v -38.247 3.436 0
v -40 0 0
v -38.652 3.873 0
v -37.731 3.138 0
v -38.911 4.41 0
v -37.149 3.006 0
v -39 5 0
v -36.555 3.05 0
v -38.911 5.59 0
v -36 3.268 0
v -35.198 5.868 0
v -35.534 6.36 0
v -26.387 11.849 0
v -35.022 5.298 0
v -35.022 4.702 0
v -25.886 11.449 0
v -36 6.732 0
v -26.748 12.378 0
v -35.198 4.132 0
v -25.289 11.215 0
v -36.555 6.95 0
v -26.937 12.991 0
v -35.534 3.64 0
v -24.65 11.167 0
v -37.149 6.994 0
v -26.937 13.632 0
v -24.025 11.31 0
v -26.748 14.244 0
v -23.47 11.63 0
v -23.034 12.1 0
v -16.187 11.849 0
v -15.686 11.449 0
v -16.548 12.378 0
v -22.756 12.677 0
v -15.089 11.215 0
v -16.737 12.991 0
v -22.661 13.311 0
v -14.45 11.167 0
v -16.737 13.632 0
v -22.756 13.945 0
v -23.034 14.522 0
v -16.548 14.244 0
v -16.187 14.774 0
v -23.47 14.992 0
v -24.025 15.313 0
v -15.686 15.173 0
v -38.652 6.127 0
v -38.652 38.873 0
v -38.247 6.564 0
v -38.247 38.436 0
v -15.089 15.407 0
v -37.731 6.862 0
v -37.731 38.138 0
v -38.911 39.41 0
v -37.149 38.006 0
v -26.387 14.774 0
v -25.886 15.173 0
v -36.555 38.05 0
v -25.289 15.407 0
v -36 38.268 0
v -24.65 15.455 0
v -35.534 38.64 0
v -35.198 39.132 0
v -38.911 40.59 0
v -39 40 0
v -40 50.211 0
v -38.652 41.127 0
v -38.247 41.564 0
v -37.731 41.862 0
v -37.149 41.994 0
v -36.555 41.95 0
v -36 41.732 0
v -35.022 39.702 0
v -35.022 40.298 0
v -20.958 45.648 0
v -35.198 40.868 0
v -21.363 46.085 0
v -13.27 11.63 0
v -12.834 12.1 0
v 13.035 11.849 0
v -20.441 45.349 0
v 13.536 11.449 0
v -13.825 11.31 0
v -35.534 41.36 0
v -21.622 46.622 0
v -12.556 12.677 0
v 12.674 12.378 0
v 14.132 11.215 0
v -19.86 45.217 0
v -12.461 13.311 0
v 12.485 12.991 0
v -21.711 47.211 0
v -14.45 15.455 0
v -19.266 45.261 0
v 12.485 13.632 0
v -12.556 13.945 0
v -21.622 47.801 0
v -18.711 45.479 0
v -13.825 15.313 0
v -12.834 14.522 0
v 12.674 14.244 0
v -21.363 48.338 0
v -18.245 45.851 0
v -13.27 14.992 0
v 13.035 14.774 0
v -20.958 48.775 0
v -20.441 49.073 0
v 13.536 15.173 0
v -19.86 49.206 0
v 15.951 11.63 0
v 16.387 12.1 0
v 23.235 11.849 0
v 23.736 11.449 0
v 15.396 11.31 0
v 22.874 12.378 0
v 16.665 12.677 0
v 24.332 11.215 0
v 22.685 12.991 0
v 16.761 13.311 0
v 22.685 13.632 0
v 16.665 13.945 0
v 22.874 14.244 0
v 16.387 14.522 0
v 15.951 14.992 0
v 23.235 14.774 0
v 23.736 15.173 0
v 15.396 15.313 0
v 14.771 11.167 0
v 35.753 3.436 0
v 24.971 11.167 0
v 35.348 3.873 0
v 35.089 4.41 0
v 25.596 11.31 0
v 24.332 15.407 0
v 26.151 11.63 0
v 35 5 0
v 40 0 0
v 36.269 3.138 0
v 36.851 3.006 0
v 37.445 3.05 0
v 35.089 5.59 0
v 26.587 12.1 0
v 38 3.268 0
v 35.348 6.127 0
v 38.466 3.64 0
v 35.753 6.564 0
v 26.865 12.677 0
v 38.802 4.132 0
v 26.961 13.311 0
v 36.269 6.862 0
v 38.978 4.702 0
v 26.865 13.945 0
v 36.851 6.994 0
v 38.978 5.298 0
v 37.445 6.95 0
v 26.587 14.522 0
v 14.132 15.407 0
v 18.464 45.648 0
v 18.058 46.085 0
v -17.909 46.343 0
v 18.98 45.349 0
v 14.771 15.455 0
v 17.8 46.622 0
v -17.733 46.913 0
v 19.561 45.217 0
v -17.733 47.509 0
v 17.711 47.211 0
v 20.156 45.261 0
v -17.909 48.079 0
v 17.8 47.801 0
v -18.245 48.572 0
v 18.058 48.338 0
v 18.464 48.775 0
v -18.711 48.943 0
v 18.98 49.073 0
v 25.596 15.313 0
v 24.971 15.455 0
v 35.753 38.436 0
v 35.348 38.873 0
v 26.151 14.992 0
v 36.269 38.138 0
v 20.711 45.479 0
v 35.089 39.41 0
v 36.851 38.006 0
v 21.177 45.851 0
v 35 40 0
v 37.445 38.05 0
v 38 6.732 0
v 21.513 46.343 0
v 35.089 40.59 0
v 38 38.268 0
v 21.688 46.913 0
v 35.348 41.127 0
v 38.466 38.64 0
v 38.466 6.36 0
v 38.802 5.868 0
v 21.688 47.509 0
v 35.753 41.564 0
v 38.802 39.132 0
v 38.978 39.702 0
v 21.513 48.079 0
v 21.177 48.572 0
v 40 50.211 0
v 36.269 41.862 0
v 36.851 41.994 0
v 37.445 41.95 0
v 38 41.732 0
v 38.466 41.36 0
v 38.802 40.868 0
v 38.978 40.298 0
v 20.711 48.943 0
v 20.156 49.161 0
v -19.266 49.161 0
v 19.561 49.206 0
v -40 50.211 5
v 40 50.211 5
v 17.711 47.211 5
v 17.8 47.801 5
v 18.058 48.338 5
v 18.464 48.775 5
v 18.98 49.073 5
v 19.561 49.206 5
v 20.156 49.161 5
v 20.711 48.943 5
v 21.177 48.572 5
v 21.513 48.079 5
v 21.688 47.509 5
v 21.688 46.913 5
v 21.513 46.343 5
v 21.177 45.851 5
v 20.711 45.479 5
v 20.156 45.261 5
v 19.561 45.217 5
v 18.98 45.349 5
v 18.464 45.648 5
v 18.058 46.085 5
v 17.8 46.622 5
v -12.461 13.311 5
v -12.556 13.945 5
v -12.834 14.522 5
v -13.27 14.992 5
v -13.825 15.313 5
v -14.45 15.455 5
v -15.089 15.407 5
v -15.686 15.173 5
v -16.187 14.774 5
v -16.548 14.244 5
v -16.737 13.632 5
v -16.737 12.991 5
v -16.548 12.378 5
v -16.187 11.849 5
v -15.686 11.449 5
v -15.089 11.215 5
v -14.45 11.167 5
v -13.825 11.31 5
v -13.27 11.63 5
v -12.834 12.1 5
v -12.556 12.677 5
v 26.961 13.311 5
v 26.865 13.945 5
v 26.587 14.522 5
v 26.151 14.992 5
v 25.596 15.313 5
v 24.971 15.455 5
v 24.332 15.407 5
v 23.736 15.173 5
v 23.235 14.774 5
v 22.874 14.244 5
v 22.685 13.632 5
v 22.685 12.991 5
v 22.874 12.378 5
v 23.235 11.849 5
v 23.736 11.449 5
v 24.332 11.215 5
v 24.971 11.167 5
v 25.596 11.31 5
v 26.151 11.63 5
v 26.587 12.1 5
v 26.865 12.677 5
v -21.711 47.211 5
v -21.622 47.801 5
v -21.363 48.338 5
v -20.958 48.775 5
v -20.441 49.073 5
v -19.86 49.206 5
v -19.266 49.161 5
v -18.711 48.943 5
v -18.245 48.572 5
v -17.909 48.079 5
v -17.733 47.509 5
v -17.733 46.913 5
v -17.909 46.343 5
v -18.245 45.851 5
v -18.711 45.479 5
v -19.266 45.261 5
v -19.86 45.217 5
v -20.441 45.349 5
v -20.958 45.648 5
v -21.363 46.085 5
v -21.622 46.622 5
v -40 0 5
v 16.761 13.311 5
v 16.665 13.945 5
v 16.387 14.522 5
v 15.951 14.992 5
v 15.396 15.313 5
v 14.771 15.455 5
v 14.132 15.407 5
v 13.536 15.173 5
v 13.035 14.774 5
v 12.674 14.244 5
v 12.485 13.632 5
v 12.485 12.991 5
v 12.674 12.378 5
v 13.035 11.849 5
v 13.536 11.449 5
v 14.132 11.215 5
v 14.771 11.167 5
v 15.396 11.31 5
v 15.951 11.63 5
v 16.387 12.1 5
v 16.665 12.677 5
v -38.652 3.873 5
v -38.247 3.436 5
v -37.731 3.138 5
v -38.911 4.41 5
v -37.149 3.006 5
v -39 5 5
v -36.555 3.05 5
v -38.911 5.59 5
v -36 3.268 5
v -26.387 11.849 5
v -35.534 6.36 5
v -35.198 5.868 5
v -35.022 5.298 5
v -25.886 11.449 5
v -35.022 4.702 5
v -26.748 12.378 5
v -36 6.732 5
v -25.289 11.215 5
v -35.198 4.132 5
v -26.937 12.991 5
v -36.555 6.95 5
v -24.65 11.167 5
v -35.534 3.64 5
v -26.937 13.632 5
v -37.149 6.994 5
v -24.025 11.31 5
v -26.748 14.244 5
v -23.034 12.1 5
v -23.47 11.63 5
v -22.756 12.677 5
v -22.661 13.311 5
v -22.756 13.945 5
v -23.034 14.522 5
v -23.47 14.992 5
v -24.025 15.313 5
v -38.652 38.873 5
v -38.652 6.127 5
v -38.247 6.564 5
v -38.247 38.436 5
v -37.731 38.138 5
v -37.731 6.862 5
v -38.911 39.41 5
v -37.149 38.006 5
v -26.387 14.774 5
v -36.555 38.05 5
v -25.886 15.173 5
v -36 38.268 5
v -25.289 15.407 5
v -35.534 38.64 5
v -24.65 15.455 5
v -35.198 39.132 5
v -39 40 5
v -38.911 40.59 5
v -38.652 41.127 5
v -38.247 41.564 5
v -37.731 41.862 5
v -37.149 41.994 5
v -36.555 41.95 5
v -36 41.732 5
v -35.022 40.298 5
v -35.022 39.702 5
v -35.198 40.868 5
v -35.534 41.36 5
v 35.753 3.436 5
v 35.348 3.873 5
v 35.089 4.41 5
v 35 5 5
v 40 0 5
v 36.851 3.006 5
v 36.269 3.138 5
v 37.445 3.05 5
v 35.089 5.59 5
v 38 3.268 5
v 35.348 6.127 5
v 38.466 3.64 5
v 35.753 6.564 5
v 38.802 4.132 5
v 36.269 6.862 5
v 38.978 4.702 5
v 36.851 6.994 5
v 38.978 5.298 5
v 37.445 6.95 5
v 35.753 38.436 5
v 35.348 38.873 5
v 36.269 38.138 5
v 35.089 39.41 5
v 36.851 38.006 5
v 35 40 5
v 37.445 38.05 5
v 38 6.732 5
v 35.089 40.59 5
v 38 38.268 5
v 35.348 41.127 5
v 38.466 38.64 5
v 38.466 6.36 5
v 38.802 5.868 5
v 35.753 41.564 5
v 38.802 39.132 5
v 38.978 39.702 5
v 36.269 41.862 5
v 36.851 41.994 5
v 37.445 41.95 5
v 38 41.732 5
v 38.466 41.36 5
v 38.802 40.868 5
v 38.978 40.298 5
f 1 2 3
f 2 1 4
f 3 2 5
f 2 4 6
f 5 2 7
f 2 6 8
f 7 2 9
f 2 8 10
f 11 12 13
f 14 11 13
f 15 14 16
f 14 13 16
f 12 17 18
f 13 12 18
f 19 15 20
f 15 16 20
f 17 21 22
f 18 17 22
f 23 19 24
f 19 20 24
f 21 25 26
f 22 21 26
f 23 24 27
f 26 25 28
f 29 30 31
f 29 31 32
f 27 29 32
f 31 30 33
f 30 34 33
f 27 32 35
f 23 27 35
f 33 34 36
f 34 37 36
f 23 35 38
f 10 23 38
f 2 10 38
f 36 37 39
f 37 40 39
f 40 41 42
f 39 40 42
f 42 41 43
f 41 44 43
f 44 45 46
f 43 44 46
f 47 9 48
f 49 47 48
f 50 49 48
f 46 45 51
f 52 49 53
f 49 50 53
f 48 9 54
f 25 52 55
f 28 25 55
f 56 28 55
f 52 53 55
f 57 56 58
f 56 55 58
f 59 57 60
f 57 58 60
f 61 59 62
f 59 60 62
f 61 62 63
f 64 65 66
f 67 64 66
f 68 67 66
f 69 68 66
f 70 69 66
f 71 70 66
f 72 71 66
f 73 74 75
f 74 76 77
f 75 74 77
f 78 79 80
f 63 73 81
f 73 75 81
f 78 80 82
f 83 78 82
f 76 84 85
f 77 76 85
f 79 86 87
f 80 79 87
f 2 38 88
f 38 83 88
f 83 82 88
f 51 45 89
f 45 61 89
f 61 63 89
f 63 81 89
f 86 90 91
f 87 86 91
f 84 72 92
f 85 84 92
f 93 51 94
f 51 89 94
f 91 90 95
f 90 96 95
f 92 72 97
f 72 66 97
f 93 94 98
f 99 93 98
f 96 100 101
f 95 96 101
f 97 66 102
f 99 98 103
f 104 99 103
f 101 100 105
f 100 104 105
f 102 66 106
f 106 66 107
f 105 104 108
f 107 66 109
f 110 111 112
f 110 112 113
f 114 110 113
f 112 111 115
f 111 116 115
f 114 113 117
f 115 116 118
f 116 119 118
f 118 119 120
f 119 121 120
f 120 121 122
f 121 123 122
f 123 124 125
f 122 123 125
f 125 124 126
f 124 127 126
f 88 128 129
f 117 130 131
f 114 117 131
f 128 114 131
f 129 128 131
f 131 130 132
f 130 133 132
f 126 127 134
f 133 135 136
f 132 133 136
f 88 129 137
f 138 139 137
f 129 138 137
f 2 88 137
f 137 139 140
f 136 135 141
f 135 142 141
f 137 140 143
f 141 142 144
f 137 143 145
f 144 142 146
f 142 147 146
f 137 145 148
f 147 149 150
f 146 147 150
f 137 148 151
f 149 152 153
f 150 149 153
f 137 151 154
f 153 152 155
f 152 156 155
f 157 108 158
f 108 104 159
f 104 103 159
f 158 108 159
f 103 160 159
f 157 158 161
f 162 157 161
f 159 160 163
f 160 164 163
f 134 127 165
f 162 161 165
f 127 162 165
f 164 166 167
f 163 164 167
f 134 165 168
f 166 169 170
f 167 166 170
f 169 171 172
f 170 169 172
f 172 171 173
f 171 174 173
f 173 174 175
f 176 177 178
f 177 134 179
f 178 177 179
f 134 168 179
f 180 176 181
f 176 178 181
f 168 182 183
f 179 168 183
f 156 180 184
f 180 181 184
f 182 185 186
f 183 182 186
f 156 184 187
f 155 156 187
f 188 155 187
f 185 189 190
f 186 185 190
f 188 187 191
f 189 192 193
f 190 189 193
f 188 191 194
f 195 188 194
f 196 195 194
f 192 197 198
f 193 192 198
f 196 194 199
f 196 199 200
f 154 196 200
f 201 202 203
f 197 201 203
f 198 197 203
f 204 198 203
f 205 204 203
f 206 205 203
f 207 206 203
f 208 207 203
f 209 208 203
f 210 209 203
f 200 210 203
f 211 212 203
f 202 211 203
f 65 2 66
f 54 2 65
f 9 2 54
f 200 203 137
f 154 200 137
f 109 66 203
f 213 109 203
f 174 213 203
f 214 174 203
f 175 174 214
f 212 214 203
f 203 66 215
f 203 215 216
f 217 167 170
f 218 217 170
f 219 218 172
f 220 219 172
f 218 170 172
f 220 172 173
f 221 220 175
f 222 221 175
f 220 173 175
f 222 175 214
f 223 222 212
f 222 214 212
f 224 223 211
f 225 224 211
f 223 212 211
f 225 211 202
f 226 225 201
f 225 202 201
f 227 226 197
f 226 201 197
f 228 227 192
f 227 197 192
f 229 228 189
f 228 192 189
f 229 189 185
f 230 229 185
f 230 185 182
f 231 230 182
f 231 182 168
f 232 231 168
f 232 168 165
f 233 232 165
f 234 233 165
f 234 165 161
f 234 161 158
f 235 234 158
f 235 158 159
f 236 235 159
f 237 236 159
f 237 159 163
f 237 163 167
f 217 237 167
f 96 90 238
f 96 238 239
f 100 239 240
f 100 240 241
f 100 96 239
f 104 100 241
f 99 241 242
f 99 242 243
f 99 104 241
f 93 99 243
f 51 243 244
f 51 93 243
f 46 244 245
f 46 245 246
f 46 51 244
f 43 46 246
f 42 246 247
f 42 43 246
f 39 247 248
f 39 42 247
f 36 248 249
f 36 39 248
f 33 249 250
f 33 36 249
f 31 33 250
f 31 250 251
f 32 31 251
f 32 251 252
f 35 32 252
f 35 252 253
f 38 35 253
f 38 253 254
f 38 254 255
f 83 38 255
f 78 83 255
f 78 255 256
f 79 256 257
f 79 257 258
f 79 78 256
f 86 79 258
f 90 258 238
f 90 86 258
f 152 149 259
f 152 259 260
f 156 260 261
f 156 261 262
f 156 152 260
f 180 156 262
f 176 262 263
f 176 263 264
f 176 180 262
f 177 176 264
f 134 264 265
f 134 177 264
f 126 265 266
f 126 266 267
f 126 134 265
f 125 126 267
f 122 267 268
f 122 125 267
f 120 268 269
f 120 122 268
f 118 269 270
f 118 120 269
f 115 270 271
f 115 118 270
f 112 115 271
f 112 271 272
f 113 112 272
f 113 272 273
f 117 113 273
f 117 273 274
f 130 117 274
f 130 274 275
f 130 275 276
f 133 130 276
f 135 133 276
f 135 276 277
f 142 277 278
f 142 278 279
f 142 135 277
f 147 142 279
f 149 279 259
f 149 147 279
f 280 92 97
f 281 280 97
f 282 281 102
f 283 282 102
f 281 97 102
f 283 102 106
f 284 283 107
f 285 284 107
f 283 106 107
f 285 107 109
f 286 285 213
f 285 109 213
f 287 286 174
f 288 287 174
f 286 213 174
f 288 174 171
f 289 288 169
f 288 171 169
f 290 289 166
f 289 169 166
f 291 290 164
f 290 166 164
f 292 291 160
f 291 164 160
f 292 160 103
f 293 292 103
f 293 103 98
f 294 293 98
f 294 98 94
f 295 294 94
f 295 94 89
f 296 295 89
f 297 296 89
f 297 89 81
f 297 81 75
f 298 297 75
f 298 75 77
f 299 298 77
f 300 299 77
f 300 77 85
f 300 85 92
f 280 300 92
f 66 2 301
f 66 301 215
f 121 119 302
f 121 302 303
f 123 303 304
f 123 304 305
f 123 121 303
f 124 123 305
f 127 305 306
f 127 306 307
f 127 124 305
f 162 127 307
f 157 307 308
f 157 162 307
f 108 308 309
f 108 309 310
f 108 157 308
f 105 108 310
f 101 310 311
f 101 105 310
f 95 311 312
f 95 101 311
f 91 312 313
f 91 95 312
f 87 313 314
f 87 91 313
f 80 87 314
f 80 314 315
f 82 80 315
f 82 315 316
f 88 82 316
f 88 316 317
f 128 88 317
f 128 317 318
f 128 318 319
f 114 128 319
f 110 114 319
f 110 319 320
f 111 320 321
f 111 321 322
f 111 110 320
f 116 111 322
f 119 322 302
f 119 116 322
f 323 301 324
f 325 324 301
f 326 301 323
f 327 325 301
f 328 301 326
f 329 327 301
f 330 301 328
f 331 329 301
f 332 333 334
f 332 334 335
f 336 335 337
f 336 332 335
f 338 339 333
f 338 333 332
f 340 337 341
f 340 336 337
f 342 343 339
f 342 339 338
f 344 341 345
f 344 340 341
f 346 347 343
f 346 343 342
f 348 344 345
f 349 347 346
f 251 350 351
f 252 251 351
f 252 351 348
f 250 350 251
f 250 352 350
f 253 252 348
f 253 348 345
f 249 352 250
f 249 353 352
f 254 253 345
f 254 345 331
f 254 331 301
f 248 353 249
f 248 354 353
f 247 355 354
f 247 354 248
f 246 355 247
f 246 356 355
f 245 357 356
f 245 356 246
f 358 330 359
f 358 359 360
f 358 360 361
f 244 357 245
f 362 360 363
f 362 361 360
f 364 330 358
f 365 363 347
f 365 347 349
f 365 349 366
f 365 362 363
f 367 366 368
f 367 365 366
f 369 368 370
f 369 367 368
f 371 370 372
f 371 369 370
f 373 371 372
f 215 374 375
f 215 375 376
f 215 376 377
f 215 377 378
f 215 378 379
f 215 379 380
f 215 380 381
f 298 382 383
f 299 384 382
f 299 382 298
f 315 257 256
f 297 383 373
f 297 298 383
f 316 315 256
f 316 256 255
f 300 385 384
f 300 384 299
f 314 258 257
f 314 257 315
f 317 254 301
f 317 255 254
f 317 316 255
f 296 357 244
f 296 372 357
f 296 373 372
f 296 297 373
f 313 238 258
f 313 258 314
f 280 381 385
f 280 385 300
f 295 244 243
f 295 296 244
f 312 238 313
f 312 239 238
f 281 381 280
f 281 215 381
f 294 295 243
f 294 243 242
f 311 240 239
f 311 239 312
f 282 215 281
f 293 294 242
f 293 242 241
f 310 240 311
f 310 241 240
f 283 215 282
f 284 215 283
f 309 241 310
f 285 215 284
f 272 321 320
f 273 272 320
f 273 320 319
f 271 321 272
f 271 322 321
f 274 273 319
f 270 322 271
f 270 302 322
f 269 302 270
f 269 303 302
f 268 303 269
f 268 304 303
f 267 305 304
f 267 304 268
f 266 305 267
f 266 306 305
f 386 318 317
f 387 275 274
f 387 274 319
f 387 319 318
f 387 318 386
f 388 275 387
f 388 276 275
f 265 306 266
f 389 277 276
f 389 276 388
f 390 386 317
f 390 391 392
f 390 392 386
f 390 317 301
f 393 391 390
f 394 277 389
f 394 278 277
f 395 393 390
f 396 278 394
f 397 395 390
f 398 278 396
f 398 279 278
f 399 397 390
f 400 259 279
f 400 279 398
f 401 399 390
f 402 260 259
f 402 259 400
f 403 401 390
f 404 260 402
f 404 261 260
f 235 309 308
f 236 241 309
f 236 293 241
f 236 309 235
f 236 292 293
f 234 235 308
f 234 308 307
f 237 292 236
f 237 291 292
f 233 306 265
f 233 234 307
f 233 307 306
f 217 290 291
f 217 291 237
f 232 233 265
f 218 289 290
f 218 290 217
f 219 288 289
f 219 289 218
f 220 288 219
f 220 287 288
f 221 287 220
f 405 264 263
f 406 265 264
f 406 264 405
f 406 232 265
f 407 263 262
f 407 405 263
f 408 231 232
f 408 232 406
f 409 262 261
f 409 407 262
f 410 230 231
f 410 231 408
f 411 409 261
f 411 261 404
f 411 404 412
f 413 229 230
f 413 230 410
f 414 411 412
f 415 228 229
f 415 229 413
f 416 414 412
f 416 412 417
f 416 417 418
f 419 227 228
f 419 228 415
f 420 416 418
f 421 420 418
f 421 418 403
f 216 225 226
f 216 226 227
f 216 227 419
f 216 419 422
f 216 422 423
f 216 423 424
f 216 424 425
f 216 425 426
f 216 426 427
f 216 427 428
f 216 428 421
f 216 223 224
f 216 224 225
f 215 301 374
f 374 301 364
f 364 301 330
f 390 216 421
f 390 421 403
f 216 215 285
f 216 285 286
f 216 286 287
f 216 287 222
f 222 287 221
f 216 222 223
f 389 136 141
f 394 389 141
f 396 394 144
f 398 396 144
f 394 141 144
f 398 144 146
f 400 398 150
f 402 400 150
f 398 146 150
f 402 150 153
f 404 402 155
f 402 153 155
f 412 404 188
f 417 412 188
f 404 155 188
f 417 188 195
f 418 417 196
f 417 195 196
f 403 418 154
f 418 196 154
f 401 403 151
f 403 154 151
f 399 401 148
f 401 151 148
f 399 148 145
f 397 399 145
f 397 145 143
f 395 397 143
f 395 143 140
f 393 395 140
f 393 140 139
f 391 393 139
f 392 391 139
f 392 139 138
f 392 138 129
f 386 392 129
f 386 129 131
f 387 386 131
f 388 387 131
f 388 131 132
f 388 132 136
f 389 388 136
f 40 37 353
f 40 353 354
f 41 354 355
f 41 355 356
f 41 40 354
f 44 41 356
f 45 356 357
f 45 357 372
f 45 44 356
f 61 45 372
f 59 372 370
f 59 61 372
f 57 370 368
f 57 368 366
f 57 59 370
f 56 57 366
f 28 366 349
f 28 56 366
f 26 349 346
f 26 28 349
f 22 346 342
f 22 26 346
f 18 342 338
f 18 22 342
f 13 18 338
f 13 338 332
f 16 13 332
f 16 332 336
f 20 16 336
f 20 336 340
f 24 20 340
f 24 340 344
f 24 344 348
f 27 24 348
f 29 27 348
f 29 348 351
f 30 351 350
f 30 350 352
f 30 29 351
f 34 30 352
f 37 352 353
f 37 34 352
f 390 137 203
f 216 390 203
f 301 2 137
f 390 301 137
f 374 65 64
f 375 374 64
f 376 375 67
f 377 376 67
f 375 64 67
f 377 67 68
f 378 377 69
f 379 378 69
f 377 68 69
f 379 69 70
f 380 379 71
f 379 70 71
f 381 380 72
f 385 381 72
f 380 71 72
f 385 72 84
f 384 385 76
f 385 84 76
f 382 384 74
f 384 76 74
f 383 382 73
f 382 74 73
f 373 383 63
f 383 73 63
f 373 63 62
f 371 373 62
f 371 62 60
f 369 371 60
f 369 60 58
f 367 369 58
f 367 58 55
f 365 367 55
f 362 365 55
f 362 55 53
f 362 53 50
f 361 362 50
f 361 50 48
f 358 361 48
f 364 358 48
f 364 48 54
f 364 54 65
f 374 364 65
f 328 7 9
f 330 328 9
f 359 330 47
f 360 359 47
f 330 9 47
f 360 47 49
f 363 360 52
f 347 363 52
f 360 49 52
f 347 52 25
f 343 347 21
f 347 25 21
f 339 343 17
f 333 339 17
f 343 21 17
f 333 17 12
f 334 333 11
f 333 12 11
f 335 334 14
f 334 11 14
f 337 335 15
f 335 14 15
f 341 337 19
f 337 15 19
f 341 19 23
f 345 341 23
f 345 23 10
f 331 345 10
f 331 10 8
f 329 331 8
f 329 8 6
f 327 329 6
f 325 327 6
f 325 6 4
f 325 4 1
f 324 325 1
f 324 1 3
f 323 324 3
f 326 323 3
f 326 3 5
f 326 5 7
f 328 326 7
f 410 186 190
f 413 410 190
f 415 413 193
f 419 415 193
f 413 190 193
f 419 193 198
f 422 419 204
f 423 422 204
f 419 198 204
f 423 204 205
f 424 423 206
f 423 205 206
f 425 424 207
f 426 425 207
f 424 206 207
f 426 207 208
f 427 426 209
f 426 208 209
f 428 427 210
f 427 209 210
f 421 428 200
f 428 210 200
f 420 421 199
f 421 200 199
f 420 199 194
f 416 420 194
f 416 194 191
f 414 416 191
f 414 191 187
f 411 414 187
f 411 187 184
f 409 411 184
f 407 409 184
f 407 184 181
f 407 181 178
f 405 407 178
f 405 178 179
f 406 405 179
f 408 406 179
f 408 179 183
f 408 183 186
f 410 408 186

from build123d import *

# Parameters (mm, degrees)
SKETCH1_W           = 80
SKETCH1_H           = 50.211199845
SKETCH1_R           = 2.15
BOSS_EXTRUDE1_DEPTH = 5
SKETCH2_R           = 2
CUT_EXTRUDE1_DEPTH  = 10


with BuildPart() as part:
    # Sketch1 → Boss-Extrude1 (new body)
    with BuildSketch(Plane.XY):
        with Locations((0, 25.105599923)):
            Rectangle(SKETCH1_W, SKETCH1_H)
        with Locations((14.610738527, 13.311199845)):
            Circle(SKETCH1_R, mode=Mode.SUBTRACT)
        with Locations((24.810738527, 13.311199845)):
            Circle(SKETCH1_R, mode=Mode.SUBTRACT)
        with Locations((-14.610738527, 13.311199845)):
            Circle(SKETCH1_R, mode=Mode.SUBTRACT)
        with Locations((-24.810738527, 13.311199845)):
            Circle(SKETCH1_R, mode=Mode.SUBTRACT)
    extrude(amount=BOSS_EXTRUDE1_DEPTH)

    # Sketch2 → Cut-Extrude1 (cut)
    with BuildSketch(Plane(origin=(0, 0, 0), x_dir=(-1, 0, 0), z_dir=(0, 0, -1))):
        with Locations((19.710738527, 47.211199845)):
            Circle(SKETCH2_R)
        with Locations((-19.710738527, 47.211199845)):
            Circle(SKETCH2_R)
        with Locations((37, 40)):
            Circle(SKETCH2_R)
        with Locations((-37, 40)):
            Circle(SKETCH2_R)
        with Locations((37, 5)):
            Circle(SKETCH2_R)
        with Locations((-37, 5)):
            Circle(SKETCH2_R)
    extrude(amount=-CUT_EXTRUDE1_DEPTH, mode=Mode.SUBTRACT)


solid = part.part
